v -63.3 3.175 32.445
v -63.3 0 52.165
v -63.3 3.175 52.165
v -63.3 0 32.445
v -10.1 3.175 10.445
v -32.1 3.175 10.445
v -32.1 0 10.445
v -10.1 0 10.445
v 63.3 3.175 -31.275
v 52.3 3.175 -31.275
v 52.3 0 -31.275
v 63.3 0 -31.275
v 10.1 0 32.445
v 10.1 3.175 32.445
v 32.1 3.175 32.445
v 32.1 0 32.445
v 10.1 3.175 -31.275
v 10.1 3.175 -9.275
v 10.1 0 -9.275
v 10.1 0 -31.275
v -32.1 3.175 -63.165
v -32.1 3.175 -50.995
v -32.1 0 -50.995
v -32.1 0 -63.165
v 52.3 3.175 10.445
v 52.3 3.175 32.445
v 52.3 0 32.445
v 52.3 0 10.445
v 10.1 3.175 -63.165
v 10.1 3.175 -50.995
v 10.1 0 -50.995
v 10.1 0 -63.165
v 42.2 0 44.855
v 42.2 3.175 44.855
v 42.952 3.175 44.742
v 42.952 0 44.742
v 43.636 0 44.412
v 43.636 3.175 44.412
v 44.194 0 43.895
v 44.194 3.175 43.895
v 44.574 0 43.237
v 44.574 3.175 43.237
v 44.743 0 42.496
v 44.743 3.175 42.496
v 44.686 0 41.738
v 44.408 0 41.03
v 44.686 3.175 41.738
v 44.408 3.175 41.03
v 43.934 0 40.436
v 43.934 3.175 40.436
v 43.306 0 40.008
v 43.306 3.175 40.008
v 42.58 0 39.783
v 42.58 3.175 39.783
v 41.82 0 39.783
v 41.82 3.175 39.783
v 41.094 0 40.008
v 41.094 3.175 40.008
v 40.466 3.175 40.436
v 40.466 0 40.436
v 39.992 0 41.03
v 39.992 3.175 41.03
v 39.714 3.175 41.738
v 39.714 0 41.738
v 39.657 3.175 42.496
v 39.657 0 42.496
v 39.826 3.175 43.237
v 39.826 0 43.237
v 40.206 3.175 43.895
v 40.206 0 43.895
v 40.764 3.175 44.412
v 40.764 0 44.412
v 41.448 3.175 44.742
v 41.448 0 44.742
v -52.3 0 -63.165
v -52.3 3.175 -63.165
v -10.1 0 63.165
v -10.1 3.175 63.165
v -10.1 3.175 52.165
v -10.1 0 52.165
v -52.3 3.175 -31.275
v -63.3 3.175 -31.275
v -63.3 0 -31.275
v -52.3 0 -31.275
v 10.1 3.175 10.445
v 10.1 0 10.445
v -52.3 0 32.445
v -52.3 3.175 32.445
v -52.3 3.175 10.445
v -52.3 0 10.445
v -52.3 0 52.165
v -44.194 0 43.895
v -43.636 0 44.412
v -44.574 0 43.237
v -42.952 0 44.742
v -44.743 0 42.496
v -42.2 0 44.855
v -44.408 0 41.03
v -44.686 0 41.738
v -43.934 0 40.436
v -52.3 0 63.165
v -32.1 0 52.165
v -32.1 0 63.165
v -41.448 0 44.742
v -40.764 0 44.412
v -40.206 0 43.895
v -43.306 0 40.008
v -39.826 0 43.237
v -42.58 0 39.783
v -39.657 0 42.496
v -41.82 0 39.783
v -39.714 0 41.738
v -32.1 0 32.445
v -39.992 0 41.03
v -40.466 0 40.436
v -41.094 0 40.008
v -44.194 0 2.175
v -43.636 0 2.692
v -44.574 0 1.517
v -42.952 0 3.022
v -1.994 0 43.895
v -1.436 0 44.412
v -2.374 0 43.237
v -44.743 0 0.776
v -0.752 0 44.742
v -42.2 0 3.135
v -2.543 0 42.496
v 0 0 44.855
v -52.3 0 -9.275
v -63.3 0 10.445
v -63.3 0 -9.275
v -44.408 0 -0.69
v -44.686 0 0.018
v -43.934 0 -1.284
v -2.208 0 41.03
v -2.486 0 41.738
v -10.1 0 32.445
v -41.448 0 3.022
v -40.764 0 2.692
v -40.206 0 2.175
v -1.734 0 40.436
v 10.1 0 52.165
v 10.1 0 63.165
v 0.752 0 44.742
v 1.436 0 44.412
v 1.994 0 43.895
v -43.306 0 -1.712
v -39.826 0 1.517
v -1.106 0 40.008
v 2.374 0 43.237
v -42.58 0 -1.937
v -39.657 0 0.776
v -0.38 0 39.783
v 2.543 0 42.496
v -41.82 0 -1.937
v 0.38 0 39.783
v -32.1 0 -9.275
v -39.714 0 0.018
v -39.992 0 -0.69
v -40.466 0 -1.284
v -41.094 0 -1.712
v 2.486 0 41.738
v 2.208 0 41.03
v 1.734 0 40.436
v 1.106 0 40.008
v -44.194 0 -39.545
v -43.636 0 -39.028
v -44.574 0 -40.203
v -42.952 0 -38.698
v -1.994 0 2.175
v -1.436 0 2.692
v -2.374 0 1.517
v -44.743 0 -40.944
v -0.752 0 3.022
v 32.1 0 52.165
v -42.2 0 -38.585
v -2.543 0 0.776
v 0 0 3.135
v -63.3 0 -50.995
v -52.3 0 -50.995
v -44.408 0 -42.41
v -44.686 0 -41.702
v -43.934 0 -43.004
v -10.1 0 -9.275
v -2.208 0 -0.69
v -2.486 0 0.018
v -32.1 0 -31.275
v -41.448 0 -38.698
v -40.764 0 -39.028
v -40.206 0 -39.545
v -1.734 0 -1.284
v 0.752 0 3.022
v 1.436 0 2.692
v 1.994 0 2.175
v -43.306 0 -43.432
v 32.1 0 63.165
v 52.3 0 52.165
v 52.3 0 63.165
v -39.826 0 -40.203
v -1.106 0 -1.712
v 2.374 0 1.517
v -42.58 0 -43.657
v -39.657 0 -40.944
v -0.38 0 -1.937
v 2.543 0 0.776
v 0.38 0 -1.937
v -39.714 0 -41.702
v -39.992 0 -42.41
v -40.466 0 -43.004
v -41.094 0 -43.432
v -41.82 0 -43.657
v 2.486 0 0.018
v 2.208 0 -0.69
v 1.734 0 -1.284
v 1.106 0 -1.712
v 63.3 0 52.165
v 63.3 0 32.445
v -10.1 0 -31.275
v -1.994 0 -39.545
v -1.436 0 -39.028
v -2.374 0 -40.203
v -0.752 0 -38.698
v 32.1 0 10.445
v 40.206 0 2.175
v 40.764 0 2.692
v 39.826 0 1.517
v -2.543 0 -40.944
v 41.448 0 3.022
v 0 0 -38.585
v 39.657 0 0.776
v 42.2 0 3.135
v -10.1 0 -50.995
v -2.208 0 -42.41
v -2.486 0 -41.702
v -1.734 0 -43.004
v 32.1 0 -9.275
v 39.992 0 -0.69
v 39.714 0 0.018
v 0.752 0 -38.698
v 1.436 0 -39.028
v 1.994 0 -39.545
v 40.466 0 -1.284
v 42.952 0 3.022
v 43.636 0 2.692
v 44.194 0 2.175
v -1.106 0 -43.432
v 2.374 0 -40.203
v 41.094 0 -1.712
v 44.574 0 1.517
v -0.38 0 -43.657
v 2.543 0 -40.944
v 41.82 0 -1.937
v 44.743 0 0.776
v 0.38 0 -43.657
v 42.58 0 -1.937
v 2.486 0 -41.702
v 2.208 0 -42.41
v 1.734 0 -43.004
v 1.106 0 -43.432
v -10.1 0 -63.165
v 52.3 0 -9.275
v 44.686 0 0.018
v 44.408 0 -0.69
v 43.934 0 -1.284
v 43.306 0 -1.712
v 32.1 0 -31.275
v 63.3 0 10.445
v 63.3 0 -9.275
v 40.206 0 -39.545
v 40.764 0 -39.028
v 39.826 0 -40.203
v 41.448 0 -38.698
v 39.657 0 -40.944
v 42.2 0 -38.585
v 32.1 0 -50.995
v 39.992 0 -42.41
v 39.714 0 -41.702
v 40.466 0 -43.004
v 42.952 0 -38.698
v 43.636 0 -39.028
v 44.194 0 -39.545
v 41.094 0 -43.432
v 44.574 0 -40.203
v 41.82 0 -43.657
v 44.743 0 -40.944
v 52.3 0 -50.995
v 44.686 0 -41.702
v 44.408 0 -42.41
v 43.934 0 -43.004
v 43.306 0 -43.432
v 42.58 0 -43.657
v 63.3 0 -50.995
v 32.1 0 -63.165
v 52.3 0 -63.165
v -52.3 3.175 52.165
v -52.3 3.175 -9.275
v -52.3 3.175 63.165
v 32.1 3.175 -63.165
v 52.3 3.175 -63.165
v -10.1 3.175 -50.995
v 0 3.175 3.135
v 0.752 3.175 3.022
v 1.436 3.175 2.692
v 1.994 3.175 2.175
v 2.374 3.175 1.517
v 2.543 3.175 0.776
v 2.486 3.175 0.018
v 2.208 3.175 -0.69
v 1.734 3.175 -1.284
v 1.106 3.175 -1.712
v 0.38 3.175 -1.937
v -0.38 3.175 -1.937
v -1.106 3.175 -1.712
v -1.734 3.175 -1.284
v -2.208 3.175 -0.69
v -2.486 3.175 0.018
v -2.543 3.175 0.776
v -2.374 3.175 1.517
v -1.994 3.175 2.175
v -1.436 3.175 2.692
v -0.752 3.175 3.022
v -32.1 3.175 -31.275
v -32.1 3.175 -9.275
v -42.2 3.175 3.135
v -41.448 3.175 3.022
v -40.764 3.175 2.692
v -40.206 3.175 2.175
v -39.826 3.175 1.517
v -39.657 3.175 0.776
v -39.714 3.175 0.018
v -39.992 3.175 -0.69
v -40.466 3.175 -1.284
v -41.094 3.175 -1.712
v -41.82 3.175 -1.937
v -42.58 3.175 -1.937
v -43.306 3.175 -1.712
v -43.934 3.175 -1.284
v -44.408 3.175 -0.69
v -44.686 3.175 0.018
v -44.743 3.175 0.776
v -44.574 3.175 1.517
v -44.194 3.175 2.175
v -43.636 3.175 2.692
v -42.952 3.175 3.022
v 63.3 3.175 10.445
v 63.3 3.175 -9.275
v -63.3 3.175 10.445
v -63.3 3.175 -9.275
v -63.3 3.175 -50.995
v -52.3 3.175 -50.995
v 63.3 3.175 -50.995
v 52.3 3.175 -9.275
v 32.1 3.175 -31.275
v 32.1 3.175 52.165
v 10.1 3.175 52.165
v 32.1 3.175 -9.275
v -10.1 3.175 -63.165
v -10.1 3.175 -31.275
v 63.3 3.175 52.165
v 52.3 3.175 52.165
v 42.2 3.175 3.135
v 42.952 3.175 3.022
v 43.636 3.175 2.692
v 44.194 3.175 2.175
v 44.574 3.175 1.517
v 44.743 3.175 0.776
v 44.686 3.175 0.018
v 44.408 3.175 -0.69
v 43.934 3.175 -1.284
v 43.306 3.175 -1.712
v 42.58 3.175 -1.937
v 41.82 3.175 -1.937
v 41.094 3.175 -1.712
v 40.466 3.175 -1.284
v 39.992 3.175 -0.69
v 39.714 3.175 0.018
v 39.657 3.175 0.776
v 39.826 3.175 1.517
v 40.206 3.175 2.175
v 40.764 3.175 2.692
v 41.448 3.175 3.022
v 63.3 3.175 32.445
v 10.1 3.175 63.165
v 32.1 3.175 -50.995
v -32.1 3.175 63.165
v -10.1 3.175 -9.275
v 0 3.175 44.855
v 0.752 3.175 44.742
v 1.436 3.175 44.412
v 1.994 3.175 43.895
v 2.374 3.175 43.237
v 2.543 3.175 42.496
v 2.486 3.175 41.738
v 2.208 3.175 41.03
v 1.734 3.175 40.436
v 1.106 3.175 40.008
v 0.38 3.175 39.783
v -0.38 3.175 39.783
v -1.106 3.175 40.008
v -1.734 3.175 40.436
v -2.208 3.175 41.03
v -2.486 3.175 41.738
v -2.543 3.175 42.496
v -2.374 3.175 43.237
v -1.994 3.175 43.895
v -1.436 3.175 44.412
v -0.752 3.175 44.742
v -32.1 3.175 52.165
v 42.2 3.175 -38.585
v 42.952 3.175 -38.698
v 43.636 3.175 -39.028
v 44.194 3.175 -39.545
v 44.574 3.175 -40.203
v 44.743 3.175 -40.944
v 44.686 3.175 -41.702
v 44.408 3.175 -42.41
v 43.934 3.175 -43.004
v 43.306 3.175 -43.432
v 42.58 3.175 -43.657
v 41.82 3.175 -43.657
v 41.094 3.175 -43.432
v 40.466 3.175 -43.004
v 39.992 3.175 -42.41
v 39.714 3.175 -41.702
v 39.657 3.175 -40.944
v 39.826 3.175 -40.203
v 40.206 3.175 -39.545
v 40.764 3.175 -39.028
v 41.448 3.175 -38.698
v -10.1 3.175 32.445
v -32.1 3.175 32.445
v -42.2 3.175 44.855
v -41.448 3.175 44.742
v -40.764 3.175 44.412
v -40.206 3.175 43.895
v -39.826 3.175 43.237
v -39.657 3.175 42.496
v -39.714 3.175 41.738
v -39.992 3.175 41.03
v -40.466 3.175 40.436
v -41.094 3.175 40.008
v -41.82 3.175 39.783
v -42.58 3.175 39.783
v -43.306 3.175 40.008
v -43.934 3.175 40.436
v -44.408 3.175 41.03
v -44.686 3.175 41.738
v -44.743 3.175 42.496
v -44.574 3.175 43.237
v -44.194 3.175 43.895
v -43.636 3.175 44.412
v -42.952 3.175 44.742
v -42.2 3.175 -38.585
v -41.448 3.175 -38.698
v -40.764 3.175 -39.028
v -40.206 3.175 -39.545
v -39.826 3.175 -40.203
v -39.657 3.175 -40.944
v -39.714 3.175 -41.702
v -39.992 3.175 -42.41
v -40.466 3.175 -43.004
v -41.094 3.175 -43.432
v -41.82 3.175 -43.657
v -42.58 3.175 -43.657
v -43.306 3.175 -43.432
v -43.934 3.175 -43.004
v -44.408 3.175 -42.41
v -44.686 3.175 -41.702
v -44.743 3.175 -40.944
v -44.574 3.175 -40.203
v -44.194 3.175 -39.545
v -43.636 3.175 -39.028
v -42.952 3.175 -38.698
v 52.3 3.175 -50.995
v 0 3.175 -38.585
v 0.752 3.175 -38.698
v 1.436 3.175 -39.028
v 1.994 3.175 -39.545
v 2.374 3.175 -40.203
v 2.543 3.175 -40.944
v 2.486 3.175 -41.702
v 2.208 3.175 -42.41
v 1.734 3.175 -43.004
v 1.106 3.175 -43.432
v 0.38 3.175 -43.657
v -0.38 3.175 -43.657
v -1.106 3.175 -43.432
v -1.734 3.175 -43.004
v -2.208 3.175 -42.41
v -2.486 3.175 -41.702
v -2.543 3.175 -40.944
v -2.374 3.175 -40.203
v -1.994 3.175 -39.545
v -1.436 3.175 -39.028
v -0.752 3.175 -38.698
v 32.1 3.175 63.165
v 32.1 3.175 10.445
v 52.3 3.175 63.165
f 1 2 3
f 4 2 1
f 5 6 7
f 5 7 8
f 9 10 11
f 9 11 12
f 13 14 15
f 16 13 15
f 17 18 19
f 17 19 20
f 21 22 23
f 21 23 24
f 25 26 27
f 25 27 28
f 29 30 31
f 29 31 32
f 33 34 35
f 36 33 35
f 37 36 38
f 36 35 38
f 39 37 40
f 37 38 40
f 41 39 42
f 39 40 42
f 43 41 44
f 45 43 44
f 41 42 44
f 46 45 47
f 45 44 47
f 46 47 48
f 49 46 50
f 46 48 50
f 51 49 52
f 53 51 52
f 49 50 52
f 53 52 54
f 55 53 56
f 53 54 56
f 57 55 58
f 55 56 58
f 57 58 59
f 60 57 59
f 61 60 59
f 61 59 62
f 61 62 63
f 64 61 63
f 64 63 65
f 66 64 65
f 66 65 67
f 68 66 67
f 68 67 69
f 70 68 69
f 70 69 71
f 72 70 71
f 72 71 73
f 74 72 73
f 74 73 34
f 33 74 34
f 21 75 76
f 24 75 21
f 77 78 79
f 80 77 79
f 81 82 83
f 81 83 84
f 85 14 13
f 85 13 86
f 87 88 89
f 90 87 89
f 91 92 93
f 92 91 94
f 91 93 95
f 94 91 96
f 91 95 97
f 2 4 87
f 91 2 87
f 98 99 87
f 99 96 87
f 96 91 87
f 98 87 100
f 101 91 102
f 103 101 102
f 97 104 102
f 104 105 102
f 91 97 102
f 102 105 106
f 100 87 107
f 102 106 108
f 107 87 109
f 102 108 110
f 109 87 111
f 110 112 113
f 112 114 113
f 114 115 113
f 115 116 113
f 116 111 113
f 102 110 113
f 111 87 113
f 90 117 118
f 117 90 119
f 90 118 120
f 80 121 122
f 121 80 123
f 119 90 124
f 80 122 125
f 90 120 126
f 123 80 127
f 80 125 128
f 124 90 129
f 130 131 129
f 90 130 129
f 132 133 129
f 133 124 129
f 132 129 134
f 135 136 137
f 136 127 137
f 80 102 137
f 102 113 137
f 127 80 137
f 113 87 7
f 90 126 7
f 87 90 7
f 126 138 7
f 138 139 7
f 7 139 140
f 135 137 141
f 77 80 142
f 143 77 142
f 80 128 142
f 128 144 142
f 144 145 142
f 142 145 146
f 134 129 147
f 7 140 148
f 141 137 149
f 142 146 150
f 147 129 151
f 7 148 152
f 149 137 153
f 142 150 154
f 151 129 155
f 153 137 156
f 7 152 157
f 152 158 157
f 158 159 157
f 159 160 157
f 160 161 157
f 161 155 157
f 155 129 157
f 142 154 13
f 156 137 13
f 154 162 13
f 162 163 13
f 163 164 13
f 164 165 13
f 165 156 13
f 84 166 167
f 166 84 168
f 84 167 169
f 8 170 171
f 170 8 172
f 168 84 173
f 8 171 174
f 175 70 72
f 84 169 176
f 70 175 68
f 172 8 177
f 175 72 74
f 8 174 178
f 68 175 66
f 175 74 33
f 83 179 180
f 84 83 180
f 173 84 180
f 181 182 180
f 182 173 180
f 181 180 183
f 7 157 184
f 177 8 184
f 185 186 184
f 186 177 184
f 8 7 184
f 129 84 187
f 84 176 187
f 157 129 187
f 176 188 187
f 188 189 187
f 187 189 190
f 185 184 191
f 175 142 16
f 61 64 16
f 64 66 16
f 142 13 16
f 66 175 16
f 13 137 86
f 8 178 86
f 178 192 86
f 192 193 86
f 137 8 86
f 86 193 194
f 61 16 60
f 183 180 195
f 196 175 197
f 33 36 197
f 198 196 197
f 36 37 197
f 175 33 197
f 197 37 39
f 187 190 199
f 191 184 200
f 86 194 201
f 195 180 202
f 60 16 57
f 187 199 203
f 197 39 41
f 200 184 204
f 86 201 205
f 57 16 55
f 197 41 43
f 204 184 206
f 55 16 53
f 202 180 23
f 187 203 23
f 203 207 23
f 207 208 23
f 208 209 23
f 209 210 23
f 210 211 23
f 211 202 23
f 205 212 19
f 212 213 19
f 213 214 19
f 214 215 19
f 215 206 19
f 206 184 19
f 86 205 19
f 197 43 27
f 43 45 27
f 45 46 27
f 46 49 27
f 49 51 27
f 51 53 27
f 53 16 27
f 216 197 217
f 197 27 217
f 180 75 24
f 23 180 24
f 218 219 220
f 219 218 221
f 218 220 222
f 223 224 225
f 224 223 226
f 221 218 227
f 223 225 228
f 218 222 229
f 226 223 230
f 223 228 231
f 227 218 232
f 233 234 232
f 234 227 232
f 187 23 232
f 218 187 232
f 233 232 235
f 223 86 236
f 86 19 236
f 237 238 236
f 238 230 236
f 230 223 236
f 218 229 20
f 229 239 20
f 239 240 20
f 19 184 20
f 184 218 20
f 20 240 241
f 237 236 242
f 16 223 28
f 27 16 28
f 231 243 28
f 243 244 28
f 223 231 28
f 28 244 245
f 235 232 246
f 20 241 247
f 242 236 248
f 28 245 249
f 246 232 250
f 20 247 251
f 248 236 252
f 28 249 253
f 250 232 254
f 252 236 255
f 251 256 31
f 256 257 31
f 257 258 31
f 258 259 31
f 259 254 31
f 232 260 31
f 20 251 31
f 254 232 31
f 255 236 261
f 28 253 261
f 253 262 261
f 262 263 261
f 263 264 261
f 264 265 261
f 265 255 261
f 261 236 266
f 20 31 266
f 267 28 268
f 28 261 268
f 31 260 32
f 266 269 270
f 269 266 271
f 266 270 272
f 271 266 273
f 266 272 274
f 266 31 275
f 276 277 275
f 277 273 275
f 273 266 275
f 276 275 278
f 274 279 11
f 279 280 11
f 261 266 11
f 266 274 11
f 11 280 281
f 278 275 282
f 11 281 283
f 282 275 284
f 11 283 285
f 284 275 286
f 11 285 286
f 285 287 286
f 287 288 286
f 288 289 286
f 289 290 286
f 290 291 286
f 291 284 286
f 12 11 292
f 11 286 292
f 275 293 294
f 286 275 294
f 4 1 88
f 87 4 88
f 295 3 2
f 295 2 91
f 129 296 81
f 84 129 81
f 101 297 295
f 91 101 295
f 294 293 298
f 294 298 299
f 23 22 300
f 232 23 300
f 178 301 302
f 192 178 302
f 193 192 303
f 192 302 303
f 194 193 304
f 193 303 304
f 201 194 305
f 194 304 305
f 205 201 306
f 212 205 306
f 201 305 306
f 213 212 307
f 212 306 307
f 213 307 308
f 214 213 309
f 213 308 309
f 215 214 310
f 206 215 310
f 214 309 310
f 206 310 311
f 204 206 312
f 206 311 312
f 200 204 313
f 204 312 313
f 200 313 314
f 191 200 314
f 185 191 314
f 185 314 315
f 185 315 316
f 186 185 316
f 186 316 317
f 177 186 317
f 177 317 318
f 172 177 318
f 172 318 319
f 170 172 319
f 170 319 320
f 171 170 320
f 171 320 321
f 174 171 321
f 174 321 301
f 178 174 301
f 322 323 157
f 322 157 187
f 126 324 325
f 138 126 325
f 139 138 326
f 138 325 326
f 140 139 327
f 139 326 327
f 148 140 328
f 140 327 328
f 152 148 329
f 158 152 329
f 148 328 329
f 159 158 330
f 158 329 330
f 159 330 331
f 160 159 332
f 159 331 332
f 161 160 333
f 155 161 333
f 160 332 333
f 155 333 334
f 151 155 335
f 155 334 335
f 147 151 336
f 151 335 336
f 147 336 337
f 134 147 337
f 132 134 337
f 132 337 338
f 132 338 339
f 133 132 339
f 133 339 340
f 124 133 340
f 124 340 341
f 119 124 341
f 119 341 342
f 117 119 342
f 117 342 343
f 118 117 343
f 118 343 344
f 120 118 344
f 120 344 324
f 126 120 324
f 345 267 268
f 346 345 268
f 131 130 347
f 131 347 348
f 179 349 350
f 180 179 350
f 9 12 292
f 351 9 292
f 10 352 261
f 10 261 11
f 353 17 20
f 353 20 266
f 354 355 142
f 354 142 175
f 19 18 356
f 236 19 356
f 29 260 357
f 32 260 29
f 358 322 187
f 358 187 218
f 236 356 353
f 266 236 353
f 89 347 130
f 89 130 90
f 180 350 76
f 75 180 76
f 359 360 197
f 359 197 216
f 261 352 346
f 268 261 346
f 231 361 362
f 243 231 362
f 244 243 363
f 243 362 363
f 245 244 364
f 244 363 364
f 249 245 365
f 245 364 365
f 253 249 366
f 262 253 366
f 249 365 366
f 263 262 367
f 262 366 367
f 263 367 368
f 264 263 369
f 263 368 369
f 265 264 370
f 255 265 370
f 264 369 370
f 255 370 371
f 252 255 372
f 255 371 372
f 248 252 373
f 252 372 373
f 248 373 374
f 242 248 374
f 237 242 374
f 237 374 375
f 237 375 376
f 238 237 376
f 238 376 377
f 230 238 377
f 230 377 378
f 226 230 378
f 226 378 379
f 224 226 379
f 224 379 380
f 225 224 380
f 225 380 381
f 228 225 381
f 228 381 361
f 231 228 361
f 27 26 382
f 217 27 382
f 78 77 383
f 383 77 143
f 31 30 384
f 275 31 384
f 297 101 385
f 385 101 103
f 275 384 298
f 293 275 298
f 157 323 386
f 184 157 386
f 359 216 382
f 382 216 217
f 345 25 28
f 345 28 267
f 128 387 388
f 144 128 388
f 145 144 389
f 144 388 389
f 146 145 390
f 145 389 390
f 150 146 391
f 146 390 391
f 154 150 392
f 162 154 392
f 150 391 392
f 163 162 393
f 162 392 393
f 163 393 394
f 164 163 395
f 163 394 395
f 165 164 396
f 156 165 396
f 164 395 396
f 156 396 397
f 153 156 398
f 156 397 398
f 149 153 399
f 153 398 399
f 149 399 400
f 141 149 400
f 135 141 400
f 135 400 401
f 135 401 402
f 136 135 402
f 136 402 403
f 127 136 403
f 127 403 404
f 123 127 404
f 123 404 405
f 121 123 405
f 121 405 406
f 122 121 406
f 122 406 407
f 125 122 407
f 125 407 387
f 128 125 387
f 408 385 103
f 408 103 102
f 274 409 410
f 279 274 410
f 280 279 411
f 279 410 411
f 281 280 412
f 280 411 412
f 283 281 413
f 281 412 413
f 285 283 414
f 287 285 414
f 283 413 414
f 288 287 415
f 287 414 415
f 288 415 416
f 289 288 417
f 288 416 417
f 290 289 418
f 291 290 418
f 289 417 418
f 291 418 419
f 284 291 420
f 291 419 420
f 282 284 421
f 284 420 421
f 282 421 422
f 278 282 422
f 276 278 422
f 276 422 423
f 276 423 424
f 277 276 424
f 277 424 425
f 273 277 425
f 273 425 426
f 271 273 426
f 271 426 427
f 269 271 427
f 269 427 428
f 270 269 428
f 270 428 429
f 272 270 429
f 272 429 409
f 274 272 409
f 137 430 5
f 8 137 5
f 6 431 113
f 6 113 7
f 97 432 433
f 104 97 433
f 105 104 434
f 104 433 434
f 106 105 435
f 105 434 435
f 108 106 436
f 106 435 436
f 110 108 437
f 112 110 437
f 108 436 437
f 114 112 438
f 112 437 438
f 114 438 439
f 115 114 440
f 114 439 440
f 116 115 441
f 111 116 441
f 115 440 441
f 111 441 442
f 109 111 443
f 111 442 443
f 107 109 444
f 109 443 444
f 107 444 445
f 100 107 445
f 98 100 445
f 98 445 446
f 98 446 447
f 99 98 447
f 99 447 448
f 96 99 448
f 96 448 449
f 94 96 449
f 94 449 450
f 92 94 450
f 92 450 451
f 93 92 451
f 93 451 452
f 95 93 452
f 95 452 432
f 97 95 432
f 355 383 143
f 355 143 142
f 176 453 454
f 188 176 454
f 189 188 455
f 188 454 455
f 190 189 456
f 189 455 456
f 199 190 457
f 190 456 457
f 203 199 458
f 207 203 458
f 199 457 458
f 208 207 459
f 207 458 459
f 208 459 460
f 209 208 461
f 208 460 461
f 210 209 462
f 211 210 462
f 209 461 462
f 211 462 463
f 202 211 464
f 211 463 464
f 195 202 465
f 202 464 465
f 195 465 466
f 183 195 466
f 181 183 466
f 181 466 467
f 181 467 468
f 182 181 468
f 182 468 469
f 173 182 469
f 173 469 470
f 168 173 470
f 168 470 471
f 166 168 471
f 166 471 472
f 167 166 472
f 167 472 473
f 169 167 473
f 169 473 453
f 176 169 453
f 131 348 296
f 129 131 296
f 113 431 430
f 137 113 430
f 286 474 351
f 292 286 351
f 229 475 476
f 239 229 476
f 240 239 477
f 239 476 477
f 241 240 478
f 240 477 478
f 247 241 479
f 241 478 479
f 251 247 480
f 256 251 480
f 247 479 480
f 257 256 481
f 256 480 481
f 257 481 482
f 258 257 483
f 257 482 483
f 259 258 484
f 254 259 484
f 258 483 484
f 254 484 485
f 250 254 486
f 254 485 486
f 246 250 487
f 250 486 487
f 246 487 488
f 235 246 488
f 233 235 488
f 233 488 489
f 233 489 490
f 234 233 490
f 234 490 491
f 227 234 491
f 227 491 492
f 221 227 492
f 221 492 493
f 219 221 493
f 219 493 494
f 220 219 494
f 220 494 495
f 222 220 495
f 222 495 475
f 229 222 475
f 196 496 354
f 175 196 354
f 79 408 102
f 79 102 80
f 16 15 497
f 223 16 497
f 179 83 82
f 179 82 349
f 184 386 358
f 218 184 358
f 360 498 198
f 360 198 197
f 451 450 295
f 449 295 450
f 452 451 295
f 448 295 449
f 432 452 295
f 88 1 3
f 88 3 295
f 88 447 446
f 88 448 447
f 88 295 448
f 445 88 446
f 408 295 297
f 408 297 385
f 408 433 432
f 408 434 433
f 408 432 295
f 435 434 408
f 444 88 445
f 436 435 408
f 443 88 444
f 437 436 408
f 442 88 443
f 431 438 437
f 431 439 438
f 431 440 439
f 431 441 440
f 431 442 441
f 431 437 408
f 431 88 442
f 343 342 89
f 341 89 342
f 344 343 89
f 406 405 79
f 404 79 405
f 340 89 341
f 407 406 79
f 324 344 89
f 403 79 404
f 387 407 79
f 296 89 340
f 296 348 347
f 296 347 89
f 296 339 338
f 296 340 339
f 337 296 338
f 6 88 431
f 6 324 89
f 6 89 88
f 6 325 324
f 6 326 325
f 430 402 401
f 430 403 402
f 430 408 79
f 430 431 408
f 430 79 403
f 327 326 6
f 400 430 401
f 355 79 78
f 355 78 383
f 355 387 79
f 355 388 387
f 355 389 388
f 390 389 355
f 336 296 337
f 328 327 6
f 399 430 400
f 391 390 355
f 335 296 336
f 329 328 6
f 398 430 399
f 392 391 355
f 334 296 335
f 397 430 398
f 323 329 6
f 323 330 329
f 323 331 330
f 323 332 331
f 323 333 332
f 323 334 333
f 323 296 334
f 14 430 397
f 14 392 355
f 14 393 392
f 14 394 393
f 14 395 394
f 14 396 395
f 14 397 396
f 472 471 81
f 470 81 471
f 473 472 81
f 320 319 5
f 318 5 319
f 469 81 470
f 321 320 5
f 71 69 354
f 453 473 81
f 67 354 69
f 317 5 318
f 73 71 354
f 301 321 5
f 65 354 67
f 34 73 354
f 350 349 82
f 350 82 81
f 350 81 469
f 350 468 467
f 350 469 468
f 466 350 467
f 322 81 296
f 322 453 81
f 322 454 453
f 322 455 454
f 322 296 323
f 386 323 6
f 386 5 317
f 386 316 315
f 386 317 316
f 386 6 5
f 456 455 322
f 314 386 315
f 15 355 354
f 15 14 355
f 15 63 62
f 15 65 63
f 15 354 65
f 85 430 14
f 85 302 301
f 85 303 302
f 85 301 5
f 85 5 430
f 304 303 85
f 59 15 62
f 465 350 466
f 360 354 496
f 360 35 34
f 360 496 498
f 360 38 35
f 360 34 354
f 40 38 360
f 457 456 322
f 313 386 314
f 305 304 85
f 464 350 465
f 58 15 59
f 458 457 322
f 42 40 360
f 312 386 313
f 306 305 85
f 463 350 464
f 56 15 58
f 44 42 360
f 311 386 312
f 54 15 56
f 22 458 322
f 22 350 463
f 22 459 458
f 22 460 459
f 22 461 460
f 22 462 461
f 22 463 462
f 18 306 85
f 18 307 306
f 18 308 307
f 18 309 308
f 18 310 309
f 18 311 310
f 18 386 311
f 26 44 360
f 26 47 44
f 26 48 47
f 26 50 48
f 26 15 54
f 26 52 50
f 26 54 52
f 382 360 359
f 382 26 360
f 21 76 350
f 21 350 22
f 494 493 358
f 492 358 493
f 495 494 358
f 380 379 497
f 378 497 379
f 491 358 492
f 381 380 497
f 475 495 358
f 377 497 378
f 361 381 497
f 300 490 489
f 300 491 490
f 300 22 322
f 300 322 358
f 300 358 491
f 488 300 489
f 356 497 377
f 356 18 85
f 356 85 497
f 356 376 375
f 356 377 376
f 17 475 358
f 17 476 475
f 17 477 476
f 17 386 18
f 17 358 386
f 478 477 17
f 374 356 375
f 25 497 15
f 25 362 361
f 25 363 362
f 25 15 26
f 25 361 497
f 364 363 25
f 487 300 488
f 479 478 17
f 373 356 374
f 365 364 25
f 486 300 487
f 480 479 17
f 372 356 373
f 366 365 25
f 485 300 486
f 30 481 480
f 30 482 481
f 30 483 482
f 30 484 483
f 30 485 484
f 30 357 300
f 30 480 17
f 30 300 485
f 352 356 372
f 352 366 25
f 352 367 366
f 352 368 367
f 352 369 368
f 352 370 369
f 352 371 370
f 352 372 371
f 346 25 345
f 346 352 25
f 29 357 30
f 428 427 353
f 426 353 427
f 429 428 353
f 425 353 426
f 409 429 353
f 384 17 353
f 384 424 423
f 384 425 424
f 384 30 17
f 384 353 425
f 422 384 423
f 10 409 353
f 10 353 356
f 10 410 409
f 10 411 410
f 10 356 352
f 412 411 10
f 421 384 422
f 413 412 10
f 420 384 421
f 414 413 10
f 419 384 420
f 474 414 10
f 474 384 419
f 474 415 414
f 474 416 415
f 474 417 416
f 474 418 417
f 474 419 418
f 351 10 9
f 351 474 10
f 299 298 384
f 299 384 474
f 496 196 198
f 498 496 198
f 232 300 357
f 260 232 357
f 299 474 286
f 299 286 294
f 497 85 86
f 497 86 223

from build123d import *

# Parameters (mm, degrees)
SKETCH2_W           = 126.6
SKETCH2_H           = 126.33
BOSS_EXTRUDE1_DEPTH = 3.175
SKETCH3_W           = 22
SKETCH3_H           = 22
CUT_EXTRUDE1_DEPTH  = 90.48065629
SKETCH4_R           = 2.55
CUT_EXTRUDE2_DEPTH  = 90.48065629


with BuildPart() as part:
    # Sketch2 → Boss-Extrude1 (new body)
    with BuildSketch(Plane(origin=(0, 0, 0), x_dir=(1, 0, 0), z_dir=(0, 1, 0))):
        Rectangle(SKETCH2_W, SKETCH2_H)
    extrude(amount=BOSS_EXTRUDE1_DEPTH)

    # Sketch3 → Cut-Extrude1 (cut, through all)
    with BuildSketch(Plane(origin=(0, 3.175, 0), x_dir=(1, 0, 0), z_dir=(0, 1, 0))):
        with Locations((63.3, -63.165)):
            Rectangle(SKETCH3_W, SKETCH3_H)
        with Locations((21.1, -63.165)):
            Rectangle(SKETCH3_W, SKETCH3_H)
        with Locations((-21.1, -63.165)):
            Rectangle(SKETCH3_W, SKETCH3_H)
        with Locations((-63.3, -63.165)):
            Rectangle(SKETCH3_W, SKETCH3_H)
        with Locations((21.1, -21.445)):
            Rectangle(SKETCH3_W, SKETCH3_H)
        with Locations((-21.1, -21.445)):
            Rectangle(SKETCH3_W, SKETCH3_H)
        with Locations((-63.3, -21.445)):
            Rectangle(SKETCH3_W, SKETCH3_H)
        with Locations((21.1, 20.275)):
            Rectangle(SKETCH3_W, SKETCH3_H)
        with Locations((-21.1, 20.275)):
            Rectangle(SKETCH3_W, SKETCH3_H)
        with Locations((-63.3, 20.275)):
            Rectangle(SKETCH3_W, SKETCH3_H)
        with Locations((21.1, 61.995)):
            Rectangle(SKETCH3_W, SKETCH3_H)
        with Locations((-21.1, 61.995)):
            Rectangle(SKETCH3_W, SKETCH3_H)
        with Locations((-63.3, 61.995)):
            Rectangle(SKETCH3_W, SKETCH3_H)
        with Locations((63.3, -21.445)):
            Rectangle(SKETCH3_W, SKETCH3_H)
        with Locations((63.3, 20.275)):
            Rectangle(SKETCH3_W, SKETCH3_H)
        with Locations((63.3, 61.995)):
            Rectangle(SKETCH3_W, SKETCH3_H)
    extrude(amount=-CUT_EXTRUDE1_DEPTH, mode=Mode.SUBTRACT)

    # Sketch4 → Cut-Extrude2 (cut, through all)
    with BuildSketch(Plane(origin=(0, 3.175, 0), x_dir=(1, 0, 0), z_dir=(0, 1, 0))):
        with Locations(Location((42.2, -42.305, 0), (0, 0, 270))):
            Circle(SKETCH4_R)
        with Locations(Location((0, -42.305, 0), (0, 0, 270))):
            Circle(SKETCH4_R)
        with Locations(Location((-42.2, -42.305, 0), (0, 0, 270))):
            Circle(SKETCH4_R)
        with Locations(Location((0, -0.585, 0), (0, 0, 270))):
            Circle(SKETCH4_R)
        with Locations(Location((-42.2, -0.585, 0), (0, 0, 270))):
            Circle(SKETCH4_R)
        with Locations(Location((0, 41.135, 0), (0, 0, 270))):
            Circle(SKETCH4_R)
        with Locations(Location((-42.2, 41.135, 0), (0, 0, 270))):
            Circle(SKETCH4_R)
        with Locations(Location((42.2, -0.585, 0), (0, 0, 270))):
            Circle(SKETCH4_R)
        with Locations(Location((42.2, 41.135, 0), (0, 0, 270))):
            Circle(SKETCH4_R)
    extrude(amount=-CUT_EXTRUDE2_DEPTH, mode=Mode.SUBTRACT)


solid = part.part
